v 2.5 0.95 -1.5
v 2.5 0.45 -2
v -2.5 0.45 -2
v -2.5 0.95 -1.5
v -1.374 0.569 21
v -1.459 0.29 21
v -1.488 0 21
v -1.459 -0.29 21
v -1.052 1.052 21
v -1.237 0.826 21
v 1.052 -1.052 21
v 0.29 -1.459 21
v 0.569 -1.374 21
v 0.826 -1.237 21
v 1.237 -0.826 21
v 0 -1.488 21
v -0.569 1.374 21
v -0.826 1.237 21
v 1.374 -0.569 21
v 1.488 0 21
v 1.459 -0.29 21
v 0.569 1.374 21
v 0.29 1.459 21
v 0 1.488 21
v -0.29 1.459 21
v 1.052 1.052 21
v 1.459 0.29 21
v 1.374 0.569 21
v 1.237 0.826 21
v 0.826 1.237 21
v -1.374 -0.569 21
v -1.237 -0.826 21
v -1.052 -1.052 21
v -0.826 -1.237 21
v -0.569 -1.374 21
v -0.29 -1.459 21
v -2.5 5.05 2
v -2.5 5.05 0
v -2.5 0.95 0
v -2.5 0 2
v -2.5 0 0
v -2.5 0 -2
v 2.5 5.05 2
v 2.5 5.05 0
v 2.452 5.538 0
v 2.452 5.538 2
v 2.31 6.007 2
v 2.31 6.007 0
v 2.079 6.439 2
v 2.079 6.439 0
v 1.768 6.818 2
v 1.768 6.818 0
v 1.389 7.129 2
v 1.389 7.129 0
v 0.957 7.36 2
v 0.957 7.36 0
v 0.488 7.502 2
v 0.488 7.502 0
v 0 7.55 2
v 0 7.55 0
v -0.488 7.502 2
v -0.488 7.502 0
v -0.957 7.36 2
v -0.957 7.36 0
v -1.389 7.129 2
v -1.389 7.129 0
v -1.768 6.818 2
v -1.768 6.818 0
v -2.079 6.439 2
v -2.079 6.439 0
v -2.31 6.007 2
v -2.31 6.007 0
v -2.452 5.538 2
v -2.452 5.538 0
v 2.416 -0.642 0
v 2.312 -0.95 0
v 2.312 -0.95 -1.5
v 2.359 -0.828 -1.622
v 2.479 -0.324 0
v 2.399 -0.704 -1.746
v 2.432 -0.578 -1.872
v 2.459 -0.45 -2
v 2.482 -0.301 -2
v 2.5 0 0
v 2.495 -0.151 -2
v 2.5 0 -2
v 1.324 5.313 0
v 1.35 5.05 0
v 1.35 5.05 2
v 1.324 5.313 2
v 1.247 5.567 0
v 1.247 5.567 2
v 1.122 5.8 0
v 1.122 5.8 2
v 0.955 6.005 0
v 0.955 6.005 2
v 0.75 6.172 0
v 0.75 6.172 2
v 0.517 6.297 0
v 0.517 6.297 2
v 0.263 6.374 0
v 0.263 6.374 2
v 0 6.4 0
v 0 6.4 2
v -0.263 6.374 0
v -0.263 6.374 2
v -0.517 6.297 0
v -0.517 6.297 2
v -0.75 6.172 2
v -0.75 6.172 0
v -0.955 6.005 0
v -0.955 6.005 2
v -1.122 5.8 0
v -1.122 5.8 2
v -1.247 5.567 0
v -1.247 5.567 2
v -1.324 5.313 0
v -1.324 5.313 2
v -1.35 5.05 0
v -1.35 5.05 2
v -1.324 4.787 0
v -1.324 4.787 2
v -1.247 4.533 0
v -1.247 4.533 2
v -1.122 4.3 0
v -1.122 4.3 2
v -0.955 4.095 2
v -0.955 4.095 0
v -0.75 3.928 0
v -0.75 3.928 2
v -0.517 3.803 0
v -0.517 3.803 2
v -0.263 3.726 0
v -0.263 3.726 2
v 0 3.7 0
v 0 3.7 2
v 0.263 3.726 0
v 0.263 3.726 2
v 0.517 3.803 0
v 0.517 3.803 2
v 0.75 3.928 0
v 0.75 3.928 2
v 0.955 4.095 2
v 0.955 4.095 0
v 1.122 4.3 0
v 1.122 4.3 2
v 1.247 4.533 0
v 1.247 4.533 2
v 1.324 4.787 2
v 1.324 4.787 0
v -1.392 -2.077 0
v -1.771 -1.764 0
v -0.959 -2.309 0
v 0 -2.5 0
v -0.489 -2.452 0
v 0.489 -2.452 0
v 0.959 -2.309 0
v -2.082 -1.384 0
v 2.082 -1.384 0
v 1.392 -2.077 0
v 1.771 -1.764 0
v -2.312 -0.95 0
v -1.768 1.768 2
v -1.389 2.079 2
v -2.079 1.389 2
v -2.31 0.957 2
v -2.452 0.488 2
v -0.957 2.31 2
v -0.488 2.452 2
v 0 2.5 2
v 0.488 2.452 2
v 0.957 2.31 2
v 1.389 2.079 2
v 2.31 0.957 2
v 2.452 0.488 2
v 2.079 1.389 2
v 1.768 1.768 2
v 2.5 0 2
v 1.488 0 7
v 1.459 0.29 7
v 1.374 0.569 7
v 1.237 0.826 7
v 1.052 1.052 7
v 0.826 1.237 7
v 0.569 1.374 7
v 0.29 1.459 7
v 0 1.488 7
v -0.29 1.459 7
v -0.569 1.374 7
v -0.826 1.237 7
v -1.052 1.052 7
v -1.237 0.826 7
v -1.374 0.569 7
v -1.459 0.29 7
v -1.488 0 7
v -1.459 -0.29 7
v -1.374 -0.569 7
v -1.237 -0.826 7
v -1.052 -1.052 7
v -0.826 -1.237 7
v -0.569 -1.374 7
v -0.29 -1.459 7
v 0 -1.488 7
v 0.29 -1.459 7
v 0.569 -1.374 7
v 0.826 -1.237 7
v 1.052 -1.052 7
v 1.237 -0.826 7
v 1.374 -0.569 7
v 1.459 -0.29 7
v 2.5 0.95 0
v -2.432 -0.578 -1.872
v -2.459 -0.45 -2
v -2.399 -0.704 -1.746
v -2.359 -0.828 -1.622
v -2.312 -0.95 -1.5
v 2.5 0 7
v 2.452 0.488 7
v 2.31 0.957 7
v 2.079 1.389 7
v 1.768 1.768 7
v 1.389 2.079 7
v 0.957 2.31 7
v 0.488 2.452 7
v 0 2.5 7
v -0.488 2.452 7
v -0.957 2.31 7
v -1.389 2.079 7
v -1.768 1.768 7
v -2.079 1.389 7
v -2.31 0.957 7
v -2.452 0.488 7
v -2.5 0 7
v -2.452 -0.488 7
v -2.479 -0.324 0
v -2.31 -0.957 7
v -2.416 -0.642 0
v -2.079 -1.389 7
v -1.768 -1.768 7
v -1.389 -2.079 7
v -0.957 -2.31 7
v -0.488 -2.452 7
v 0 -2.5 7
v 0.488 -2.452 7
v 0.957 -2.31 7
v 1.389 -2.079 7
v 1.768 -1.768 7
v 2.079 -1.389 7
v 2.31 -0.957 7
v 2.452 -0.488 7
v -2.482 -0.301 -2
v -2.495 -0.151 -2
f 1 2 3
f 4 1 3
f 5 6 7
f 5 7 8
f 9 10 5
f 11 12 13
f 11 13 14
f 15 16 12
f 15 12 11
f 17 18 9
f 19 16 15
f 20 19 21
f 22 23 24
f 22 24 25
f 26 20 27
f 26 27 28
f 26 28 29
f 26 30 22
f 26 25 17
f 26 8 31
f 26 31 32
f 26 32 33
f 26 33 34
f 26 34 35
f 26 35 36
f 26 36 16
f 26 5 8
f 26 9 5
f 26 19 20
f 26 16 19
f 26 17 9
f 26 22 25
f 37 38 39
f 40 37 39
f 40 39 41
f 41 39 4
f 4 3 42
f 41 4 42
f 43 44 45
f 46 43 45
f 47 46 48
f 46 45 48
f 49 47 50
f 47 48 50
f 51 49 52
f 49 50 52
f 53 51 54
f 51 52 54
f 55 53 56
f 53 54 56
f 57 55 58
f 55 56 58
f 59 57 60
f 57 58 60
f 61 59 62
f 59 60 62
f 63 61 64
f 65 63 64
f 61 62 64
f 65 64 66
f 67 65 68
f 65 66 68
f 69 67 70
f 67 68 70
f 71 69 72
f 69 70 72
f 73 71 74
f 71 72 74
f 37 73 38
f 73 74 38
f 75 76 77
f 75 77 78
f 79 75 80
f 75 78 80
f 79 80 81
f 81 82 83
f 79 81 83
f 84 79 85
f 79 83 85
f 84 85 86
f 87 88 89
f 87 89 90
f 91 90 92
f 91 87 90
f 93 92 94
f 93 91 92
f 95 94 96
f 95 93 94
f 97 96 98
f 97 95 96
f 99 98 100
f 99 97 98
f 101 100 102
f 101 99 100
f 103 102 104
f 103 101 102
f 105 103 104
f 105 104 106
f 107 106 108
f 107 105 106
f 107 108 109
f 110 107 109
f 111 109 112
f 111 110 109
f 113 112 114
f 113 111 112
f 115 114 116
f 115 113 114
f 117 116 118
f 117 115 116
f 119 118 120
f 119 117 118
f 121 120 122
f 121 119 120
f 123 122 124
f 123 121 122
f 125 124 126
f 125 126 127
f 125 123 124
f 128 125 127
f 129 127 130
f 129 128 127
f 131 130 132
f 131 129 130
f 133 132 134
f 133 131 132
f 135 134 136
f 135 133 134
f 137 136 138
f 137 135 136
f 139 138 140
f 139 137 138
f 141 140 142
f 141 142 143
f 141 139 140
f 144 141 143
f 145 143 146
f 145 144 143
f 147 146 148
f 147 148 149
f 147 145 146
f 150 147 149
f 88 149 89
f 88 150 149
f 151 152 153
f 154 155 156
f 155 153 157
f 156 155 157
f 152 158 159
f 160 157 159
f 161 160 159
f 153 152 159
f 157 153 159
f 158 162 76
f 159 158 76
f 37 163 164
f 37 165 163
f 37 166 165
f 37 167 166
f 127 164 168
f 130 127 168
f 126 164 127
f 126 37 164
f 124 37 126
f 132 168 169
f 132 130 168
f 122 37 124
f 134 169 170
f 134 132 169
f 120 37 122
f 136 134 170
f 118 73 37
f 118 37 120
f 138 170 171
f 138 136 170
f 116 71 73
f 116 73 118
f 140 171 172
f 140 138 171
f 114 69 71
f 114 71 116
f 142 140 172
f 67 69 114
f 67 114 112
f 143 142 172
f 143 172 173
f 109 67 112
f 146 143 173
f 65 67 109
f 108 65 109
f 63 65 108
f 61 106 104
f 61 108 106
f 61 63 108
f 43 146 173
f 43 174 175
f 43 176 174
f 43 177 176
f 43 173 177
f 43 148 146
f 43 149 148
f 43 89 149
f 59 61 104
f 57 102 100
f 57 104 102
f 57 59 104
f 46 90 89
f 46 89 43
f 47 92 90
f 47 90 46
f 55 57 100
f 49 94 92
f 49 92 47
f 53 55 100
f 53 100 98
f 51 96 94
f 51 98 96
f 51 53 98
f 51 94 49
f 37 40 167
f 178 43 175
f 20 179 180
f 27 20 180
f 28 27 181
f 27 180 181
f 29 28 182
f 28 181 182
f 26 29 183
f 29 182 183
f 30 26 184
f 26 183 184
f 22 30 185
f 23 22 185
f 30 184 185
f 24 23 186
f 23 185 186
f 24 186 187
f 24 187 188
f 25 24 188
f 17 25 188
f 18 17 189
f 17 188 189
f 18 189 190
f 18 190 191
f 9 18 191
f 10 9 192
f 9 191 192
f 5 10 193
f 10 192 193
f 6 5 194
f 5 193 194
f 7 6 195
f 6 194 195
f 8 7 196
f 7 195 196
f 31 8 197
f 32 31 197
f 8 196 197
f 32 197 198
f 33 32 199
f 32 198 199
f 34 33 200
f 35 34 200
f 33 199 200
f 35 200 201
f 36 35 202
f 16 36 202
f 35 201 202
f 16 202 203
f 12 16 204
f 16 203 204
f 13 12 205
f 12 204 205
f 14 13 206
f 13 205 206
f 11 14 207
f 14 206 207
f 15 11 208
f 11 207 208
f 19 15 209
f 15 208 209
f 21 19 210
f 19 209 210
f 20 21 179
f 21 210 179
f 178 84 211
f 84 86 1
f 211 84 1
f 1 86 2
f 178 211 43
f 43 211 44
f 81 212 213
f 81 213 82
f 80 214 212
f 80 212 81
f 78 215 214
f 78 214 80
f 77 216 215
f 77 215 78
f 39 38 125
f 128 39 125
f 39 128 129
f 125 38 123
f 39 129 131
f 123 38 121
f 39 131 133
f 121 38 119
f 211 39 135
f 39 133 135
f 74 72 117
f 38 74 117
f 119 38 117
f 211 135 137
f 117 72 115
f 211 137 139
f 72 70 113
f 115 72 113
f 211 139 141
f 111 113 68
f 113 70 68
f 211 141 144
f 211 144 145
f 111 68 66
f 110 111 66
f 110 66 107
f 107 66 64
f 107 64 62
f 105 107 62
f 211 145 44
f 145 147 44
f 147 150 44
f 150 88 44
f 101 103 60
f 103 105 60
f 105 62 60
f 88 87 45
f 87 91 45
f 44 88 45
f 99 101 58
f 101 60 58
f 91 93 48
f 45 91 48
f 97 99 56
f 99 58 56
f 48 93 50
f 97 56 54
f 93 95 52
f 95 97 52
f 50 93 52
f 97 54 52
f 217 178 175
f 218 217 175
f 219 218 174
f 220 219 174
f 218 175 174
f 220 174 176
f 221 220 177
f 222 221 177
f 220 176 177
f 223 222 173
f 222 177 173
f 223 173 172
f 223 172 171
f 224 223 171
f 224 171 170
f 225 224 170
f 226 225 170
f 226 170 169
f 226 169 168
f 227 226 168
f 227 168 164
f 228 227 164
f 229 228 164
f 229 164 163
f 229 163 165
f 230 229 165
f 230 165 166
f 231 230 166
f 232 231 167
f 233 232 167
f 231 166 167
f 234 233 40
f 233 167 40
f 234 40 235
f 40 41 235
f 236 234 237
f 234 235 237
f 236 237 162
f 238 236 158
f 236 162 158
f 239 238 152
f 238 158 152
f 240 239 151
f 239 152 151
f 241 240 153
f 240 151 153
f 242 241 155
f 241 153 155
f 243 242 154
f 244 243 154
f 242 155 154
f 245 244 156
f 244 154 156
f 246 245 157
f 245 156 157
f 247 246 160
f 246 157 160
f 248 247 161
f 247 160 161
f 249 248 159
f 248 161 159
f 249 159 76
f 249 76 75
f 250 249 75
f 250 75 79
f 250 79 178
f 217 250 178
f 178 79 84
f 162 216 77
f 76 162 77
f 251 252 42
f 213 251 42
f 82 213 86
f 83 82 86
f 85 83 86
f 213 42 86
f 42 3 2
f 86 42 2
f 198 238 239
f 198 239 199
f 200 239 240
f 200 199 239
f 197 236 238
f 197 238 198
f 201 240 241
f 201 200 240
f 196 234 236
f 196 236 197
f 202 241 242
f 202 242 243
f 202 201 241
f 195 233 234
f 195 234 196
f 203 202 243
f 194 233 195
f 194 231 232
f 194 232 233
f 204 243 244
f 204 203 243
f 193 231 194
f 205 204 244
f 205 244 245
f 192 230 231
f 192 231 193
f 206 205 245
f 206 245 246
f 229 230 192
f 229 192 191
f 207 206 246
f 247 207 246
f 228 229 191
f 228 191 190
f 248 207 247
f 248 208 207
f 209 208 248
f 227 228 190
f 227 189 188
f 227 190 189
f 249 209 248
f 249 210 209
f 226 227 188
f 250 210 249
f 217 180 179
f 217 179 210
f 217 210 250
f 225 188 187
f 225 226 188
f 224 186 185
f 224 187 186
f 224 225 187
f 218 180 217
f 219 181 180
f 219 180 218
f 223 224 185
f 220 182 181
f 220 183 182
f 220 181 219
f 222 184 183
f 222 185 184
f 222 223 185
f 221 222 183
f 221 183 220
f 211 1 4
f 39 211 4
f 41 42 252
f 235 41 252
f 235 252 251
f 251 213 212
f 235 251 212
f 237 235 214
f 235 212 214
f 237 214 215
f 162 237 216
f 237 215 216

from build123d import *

# Parameters (mm, degrees)
SKETCH1_R           = 1.35
BOSS_EXTRUDE1_DEPTH = 2
SKETCH2_R           = 2.5
BOSS_EXTRUDE2_DEPTH = 5
SKETCH3_R           = 1.4875
BOSS_EXTRUDE3_DEPTH = 14
BOSS_EXTRUDE4_START = 2
BOSS_EXTRUDE4_DEPTH = 2
CHAMFER1_SIZE       = 0.5


with BuildPart() as part:
    # Sketch1 → Boss-Extrude1 (new body)
    with BuildSketch(Plane.XY):
        with BuildLine():
            Line((-2.5, 5.05), (-2.5, 0))
            ThreePointArc((-2.5, 0), (0, -2.5), (2.5, 0))
            Line((2.5, 0), (2.5, 5.05))
            ThreePointArc((2.5, 5.05), (0, 7.55), (-2.5, 5.05))
        make_face()
        with Locations((0, 5.05)):
            Circle(SKETCH1_R, mode=Mode.SUBTRACT)
    extrude(amount=BOSS_EXTRUDE1_DEPTH)

    # Sketch2 → Boss-Extrude2 (add)
    with BuildSketch(Plane.XY.offset(2)):
        Circle(SKETCH2_R)
    extrude(amount=BOSS_EXTRUDE2_DEPTH)

    # Sketch3 → Boss-Extrude3 (add)
    with BuildSketch(Plane.XY.offset(7)):
        Circle(SKETCH3_R)
    extrude(amount=BOSS_EXTRUDE3_DEPTH)

    # Sketch4 → Boss-Extrude4 (add)
    with BuildSketch(Plane(origin=(0, 0, 0), x_dir=(-1, 0, 0), z_dir=(0, 0, -1)).offset(BOSS_EXTRUDE4_START)):
        with BuildLine():
            Line((-2.5, 0), (-2.5, 0.95))
            Line((-2.5, 0.95), (2.5, 0.95))
            Line((2.5, 0.95), (2.5, 0))
            ThreePointArc((2.5, 0), (2.4526685, -0.484166531), (2.312466216, -0.95))
            Line((2.312466216, -0.95), (-2.312466216, -0.95))
            ThreePointArc((-2.312466216, -0.95), (-2.4526685, -0.484166531), (-2.5, 0))
        make_face()
    extrude(amount=-BOSS_EXTRUDE4_DEPTH)

    # Chamfer1
    chamfer1_edges = [part.edges().sort_by_distance(p)[0] for p in [
        (0, -0.95, -2),
        (0, 0.95, -2),
    ]]
    chamfer(chamfer1_edges, length=CHAMFER1_SIZE)


solid = part.part
